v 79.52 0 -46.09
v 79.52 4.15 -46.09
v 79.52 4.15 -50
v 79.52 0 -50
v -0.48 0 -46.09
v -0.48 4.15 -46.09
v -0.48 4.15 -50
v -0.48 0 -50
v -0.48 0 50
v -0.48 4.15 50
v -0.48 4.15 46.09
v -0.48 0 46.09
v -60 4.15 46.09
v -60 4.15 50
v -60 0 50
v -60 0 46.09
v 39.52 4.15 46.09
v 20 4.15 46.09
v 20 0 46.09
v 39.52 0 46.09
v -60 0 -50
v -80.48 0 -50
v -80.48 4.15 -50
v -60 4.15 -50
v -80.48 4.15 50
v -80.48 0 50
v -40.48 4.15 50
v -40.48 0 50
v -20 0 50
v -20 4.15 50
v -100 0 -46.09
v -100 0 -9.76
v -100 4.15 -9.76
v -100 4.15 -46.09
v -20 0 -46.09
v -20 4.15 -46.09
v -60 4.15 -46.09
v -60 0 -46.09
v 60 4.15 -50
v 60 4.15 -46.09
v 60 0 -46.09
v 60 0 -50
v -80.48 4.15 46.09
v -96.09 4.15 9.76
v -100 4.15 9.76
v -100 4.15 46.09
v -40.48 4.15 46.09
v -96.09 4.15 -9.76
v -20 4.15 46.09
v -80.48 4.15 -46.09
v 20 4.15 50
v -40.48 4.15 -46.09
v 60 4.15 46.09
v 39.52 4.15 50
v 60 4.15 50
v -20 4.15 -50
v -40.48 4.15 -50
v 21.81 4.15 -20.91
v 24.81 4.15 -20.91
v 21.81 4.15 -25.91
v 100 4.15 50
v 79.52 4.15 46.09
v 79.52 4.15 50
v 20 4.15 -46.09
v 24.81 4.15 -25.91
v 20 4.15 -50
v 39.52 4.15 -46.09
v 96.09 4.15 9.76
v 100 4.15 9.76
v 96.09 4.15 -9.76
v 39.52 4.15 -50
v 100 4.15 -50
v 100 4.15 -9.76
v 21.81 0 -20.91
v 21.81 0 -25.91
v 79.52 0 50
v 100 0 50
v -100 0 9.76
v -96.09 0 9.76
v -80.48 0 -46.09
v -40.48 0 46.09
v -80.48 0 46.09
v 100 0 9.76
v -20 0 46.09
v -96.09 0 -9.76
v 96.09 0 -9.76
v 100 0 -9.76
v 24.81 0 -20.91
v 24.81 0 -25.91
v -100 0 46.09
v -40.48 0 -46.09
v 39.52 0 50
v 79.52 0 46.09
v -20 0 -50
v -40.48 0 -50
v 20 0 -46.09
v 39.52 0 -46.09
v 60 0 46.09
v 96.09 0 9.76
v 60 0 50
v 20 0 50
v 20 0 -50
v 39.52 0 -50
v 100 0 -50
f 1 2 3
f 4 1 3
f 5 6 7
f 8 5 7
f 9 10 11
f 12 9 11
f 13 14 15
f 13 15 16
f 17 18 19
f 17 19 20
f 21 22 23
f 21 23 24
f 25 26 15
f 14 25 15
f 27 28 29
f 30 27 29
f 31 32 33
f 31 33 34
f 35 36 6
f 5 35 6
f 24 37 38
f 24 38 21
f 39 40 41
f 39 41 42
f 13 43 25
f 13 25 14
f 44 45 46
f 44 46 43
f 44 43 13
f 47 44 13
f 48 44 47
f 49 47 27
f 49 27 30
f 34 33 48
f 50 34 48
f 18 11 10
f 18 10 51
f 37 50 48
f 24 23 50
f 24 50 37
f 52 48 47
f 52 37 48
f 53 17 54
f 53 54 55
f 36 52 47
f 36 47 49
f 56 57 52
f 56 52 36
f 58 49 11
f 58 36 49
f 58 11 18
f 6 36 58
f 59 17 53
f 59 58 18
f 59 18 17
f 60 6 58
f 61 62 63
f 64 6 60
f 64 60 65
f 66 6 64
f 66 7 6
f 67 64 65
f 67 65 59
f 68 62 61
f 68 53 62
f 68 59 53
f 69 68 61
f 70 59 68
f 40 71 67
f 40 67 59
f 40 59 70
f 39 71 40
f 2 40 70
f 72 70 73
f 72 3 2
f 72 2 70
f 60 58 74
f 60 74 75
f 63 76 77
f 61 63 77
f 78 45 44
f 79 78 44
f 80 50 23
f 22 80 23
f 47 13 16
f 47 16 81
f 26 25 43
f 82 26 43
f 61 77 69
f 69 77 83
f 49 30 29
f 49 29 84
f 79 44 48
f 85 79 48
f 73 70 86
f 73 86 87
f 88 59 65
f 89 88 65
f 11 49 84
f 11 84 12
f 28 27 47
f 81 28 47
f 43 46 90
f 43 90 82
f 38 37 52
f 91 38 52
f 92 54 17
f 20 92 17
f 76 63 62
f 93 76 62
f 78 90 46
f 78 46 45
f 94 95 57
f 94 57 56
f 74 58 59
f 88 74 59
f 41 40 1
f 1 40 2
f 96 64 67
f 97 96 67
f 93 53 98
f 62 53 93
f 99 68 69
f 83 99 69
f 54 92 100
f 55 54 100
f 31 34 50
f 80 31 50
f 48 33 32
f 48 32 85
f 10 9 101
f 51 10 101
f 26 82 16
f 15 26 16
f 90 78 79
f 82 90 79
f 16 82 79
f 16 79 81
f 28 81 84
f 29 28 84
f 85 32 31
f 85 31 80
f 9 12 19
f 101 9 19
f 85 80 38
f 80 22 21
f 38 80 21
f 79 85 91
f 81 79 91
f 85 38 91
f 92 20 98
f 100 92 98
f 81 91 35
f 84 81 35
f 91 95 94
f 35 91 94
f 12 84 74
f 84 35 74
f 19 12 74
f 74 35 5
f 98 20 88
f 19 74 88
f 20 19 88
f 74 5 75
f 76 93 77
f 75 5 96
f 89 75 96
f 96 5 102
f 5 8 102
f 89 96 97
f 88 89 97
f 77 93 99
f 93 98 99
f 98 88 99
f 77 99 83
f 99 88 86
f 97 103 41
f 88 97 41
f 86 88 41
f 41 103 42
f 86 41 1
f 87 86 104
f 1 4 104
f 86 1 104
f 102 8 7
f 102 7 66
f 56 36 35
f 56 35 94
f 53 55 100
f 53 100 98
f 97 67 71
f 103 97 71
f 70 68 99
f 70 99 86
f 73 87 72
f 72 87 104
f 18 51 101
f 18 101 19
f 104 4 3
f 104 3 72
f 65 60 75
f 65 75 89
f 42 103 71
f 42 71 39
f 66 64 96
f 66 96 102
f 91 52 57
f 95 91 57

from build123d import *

# Parameters (mm, degrees)
SKETCH1_W           = 200
SKETCH1_H           = 100
BOSS_EXTRUDE1_DEPTH = 4.15
SKETCH3_W           = 19.52
SKETCH3_H           = 3.91
CUT_EXTRUDE2_DEPTH  = 10
SKETCH4_W           = 3.91
SKETCH4_H           = 19.52
CUT_EXTRUDE3_DEPTH  = 10
SKETCH21_W          = 3
SKETCH21_H          = 5
CUT_EXTRUDE22_DEPTH = 4.2


with BuildPart() as part:
    # Sketch1 → Boss-Extrude1 (new body)
    with BuildSketch(Plane(origin=(0, 0, 0), x_dir=(1, 0, 0), z_dir=(0, 1, 0))):
        Rectangle(SKETCH1_W, SKETCH1_H)
    extrude(amount=BOSS_EXTRUDE1_DEPTH)

    # Sketch3 → Cut-Extrude2 (cut)
    with BuildSketch(Plane(origin=(0, 4.15, 0), x_dir=(1, 0, 0), z_dir=(0, 1, 0))):
        with Locations((-90.24, 48.045)):
            Rectangle(SKETCH3_W, SKETCH3_H)
        with Locations((-90.24, -48.045)):
            Rectangle(SKETCH3_W, SKETCH3_H)
        with Locations((-50.24, 48.045)):
            Rectangle(SKETCH3_W, SKETCH3_H)
        with Locations((-10.24, 48.045)):
            Rectangle(SKETCH3_W, SKETCH3_H)
        with Locations((29.76, 48.045)):
            Rectangle(SKETCH3_W, SKETCH3_H)
        with Locations((69.76, 48.045)):
            Rectangle(SKETCH3_W, SKETCH3_H)
        with Locations((-50.24, -48.045)):
            Rectangle(SKETCH3_W, SKETCH3_H)
        with Locations((-10.24, -48.045)):
            Rectangle(SKETCH3_W, SKETCH3_H)
        with Locations((29.76, -48.045)):
            Rectangle(SKETCH3_W, SKETCH3_H)
        with Locations((69.76, -48.045)):
            Rectangle(SKETCH3_W, SKETCH3_H)
    extrude(amount=-CUT_EXTRUDE2_DEPTH, mode=Mode.SUBTRACT)

    # Sketch4 → Cut-Extrude3 (cut)
    with BuildSketch(Plane(origin=(0, 4.15, 0), x_dir=(1, 0, 0), z_dir=(0, 1, 0))):
        with Locations((-98.045, 0)):
            Rectangle(SKETCH4_W, SKETCH4_H)
        with Locations((98.045, 0)):
            Rectangle(SKETCH4_W, SKETCH4_H)
    extrude(amount=-CUT_EXTRUDE3_DEPTH, mode=Mode.SUBTRACT)

    # Sketch21 → Cut-Extrude22 (cut)
    with BuildSketch(Plane(origin=(0, 4.15, 0), x_dir=(1, 0, 0), z_dir=(0, 1, 0))):
        with Locations((23.31, 23.41)):
            Rectangle(SKETCH21_W, SKETCH21_H)
    extrude(amount=-CUT_EXTRUDE22_DEPTH, mode=Mode.SUBTRACT)


solid = part.part
